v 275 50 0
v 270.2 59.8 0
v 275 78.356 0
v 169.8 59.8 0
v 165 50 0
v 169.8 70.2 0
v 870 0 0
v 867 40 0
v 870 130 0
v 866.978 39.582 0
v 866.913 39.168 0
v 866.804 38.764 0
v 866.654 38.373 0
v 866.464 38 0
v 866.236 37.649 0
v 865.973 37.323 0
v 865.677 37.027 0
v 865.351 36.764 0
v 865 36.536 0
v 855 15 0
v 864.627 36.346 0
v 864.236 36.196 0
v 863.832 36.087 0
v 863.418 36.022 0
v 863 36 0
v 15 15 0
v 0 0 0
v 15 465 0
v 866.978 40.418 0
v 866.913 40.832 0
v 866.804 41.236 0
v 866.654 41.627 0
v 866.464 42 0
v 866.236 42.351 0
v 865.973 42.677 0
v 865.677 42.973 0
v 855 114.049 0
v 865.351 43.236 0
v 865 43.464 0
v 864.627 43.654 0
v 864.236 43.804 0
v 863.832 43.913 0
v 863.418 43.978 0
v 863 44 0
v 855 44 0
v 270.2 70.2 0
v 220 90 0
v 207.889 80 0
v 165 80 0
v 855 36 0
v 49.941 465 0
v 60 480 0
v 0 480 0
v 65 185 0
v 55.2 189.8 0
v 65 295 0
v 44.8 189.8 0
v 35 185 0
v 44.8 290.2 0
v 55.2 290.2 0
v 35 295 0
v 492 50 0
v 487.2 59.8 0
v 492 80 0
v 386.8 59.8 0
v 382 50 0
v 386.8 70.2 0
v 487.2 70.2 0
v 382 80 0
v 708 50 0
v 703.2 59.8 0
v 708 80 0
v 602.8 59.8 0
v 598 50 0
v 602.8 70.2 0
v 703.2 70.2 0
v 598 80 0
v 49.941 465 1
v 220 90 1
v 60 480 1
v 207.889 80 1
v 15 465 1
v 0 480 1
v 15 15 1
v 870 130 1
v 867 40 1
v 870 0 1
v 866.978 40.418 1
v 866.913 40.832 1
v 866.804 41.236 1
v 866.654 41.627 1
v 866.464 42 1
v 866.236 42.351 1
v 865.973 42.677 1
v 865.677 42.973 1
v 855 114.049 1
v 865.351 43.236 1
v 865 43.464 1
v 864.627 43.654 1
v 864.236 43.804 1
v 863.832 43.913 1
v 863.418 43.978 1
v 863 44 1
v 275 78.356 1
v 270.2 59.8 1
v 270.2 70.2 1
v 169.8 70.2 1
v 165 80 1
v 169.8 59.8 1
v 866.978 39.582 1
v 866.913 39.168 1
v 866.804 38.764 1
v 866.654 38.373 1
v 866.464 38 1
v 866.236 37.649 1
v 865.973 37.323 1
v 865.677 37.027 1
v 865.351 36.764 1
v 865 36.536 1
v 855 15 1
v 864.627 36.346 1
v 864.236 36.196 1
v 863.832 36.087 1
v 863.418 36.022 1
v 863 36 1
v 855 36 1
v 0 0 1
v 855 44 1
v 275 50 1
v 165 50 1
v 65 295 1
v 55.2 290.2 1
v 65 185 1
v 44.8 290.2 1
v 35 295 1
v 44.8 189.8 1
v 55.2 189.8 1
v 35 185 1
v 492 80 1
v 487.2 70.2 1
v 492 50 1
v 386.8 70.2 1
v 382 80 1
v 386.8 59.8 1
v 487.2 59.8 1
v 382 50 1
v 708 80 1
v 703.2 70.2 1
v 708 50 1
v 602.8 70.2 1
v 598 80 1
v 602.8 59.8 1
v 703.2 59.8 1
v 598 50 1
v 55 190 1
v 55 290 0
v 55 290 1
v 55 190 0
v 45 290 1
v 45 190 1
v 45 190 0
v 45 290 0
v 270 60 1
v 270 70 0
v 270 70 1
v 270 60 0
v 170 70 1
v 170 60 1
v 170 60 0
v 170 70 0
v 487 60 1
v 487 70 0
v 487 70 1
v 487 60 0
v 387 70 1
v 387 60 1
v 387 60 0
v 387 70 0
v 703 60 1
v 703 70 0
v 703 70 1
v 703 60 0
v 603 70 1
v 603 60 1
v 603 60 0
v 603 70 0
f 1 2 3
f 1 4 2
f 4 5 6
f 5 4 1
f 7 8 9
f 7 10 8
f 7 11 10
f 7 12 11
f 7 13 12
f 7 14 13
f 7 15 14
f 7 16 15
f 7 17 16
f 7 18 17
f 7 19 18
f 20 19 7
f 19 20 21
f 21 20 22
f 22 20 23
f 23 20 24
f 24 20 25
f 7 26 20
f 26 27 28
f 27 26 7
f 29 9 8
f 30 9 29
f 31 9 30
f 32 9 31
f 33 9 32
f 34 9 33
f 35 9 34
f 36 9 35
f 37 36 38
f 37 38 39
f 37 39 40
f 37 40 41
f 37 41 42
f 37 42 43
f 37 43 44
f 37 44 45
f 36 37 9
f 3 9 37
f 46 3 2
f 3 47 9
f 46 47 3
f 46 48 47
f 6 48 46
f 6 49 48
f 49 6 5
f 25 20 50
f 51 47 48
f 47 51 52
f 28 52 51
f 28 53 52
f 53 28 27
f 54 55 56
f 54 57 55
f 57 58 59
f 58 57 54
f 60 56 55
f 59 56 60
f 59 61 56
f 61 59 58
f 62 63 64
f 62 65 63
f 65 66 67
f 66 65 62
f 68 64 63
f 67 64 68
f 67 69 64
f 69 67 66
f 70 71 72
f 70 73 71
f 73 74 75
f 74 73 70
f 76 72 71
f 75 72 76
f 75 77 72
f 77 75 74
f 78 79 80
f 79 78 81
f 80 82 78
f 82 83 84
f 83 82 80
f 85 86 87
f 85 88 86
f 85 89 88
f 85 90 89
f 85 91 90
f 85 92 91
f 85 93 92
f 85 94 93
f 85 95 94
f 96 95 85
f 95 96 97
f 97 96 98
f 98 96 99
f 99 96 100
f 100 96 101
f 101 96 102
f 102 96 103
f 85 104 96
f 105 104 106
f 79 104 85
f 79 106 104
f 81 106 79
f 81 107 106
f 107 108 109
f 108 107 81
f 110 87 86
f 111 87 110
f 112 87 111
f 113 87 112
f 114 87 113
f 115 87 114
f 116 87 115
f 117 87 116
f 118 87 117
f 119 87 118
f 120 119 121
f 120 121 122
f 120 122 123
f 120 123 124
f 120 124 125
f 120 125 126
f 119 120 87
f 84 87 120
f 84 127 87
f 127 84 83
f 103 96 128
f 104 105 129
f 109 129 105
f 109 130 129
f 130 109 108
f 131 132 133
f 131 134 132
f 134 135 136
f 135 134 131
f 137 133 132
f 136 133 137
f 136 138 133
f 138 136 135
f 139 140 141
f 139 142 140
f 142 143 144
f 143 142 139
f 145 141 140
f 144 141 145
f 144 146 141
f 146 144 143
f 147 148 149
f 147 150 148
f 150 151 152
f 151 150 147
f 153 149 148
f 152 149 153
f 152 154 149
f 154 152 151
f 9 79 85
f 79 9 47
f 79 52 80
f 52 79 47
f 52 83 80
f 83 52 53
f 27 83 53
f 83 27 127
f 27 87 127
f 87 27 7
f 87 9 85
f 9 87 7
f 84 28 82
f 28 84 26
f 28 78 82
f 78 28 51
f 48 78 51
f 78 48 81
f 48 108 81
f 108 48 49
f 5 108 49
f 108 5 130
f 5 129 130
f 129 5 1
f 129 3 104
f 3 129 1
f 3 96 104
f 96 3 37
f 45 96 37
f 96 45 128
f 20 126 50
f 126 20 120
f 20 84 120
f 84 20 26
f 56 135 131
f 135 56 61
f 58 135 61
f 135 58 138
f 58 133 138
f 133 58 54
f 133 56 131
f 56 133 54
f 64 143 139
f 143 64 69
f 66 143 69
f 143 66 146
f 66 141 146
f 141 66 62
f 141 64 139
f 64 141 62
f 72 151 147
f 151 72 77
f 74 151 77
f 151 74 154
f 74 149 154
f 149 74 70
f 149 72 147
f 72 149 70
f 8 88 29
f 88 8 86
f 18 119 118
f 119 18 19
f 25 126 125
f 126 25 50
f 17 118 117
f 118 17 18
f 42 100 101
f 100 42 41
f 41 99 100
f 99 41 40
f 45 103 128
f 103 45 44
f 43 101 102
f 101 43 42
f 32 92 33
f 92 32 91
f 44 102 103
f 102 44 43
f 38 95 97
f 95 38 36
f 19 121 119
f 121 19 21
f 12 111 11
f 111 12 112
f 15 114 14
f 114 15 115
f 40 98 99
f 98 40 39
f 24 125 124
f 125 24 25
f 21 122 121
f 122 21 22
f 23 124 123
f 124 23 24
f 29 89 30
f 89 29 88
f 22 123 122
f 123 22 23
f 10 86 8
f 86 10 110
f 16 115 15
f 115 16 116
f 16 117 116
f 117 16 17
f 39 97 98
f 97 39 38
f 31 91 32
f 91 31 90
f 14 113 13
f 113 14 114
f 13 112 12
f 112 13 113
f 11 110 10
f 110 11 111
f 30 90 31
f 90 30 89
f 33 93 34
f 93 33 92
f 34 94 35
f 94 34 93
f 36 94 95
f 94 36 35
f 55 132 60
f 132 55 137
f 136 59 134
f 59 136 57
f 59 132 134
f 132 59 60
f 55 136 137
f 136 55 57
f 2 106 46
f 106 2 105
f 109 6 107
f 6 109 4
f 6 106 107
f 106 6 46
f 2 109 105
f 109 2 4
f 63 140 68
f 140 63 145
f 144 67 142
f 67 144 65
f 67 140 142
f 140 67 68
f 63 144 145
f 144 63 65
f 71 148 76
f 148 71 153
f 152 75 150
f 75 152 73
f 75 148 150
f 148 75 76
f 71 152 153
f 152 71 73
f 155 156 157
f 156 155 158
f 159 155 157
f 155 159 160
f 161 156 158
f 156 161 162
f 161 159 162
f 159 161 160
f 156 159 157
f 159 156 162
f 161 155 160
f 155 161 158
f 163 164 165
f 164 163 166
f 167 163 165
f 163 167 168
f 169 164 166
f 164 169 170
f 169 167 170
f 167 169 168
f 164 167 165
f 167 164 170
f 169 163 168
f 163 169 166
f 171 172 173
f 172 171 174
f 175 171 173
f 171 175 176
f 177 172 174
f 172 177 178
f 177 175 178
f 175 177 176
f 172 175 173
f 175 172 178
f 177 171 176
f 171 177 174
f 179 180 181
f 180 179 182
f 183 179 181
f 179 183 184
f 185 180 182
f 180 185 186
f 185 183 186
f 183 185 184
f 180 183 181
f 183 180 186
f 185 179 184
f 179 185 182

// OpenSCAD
// ==========================================
// Custom Sofa Side - Perimeter Frame Model
// ==========================================
// This model represents the perimeter frame (outline) of the custom L-shaped sofa side.
// It is intended for quick fitment testing (1mm thickness, hollow inside).
//
// Sliced into 5 printable pieces that fit on a 260mm x 260mm printer bed.
// Solid bridges are created at the connections to house the 100mm x 10mm flat bars
// and indents, allowing the frame to be assembled into one solid piece.
// All dimensions are in millimeters (mm).
//
// You can customize the parameters and choose which part to render below.

/* [Visualization & Rendering] */
// Select which part to display/export
show_part = 0; // [0:All Assembled, 1:Part 1, 2:Part 2, 3:Part 3, 4:Part 4, 5:Part 5, 6:Exploded View]

// Separation distance for the exploded view (when show_part = 6)
explode_distance = 60; // [0:200]

/* [Main Dimensions] */
// Thickness of the test frame and the connection bars (default 1mm for quick printing)
thickness = 1;

// Width of the perimeter outline band
wall_width = 15;

// Total width of the bottom edge
bottom_width = 870;

// Total height of the left edge
total_height = 480;

// Width of the horizontal flat section at the top of the backrest
top_width = 60;

// Horizontal span of the backrest slope
slope_span_x = 160;

// Vertical drop of the backrest slope
slope_drop_y = 390;

// Height of the right vertical edge (above the base)
right_height = 130;

/* [Screw Holes] */
// Diameter of the screw holes
hole_diameter = 8;

// Horizontal adjustment range of the slots
slot_length = 20;

// Height of the screw holes from the bottom edge
hole_y = 40;

// X-coordinate of the first (leftmost) hole
hole_1_x = 95;

// Distance from the first hole to the middle hole
hole_1_to_2_distance = 292;

// Distance from the first hole to the rightmost hole
hole_1_to_3_distance = 758;

/* [Alignment Bars & Slots] */
// Width of the flat alignment bars
bar_width = 10;

// Length of the flat alignment bars
bar_length = 100;

// Tolerance/clearance around the bar in the slot (3D printing clearance)
bar_tolerance = 0.2;

// X-coordinate of the single backrest connector (left side of Cut 1)
connector_x = 50;

/* [Internal Splitting Parameters] */
// X-coordinate where the backrest is split from the seat
cut_x_left = 220;

// Y-coordinate where the backrest is split horizontally
cut_y_back = 240;

// First X-coordinate splitting the seat
cut_x_seat1 = 437; // 220 + (870-220)/3 ≈ 437

// Second X-coordinate splitting the seat
cut_x_seat2 = 653; // 220 + 2*(870-220)/3 ≈ 653

// Number of fragments for circular holes (smoothness)
$fn = 60;

// 2D Profile of the Sofa Side
module sofa_side_2d() {
    points = [
        [0, 0],                                      // A: Bottom-left corner
        [bottom_width, 0],                           // B: Bottom-right corner
        [bottom_width, right_height],                // C: Top of the right vertical edge
        [top_width + slope_span_x, total_height - slope_drop_y], // D: Bottom of the backrest slope
        [top_width, total_height],                   // E: Top of the backrest slope
        [0, total_height]                            // F: Top-left corner
    ];
    
    polygon(points);
}

// 2D Frame (hollow outline with solid bridges at connection zones)
module sofa_side_2d_frame() {
    difference() {
        sofa_side_2d();
        
        // Subtract hollow interior, excluding the solid connection bridges
        difference() {
            offset(delta = -wall_width) {
                sofa_side_2d();
            }
            
            // Bridge 1 (Cut 1: Horizontal cut at Y = 240)
            translate([connector_x - 15, cut_y_back - 55])
                square([30, 110]);
                
            // Bridge 2 (Cut 2: Vertical cut at X = 220)
            translate([cut_x_left - 55, 65 - 15])
                square([110, 30]);
                
            // Bridge 3 (Cut 3: Vertical cut at X = 437)
            translate([cut_x_seat1 - 55, 65 - 15])
                square([110, 30]);
                
            // Bridge 4 (Cut 4: Vertical cut at X = 653)
            translate([cut_x_seat2 - 55, 65 - 15])
                square([110, 30]);
        }
    }
}

// Helper module for a rounded adjustment slot (horizontal)
module screw_hole_slot(x, y) {
    translate([x, y, -0.05]) {
        hull() {
            translate([-slot_length / 2, 0, 0])
                cylinder(d = hole_diameter, h = thickness + 0.1);
            translate([slot_length / 2, 0, 0])
                cylinder(d = hole_diameter, h = thickness + 0.1);
        }
    }
}

// 3D Extruded Frame with Screw Holes
module sofa_side_3d() {
    difference() {
        // Extrude the 2D frame profile
        linear_extrude(height = thickness, center = false) {
            sofa_side_2d_frame();
        }
        
        // Subtract screw holes (only visible if they intersect the frame wall)
        screw_hole_slot(hole_1_x, hole_y);
        screw_hole_slot(hole_1_x + hole_1_to_2_distance, hole_y);
        screw_hole_slot(hole_1_x + hole_1_to_3_distance, hole_y);
    }
}

// Alignment Bar Indents/Slots module
// Subtracts pockets from the cut faces. Pockets include the bar_tolerance on all sides.
module all_indents() {
    t_w = bar_width + 2 * bar_tolerance;
    t_l = bar_length + 2 * bar_tolerance;
    t_h = thickness + 0.2;
    
    // Cut 1: Vertical slot crossing Y = cut_y_back at X = connector_x
    translate([connector_x - t_w/2, cut_y_back - t_l/2, -0.1])
        cube([t_w, t_l, t_h]);
        
    // Cut 2: Horizontal slot crossing X = cut_x_left (at Y = 65)
    translate([cut_x_left - t_l/2, 65 - t_w/2, -0.1])
        cube([t_l, t_w, t_h]);
        
    // Cut 3: Horizontal slot crossing X = cut_x_seat1 (at Y = 65)
    translate([cut_x_seat1 - t_l/2, 65 - t_w/2, -0.1])
        cube([t_l, t_w, t_h]);

    // Cut 4: Horizontal slot crossing X = cut_x_seat2 (at Y = 65)
    translate([cut_x_seat2 - t_l/2, 65 - t_w/2, -0.1])
        cube([t_l, t_w, t_h]);
}

// --- MODULES FOR INDIVIDUAL PIECES ---

// Part 1: Top Left backrest frame
module part1() {
    color("LightCoral")
    difference() {
        intersection() {
            sofa_side_3d();
            translate([-50, cut_y_back, -50])
                cube([cut_x_left + 50, total_height - cut_y_back + 100, thickness + 100]);
        }
        all_indents();
    }
}

// Part 2: Bottom Left backrest base frame
module part2() {
    color("LightGreen")
    difference() {
        intersection() {
            sofa_side_3d();
            translate([-50, -50, -50])
                cube([cut_x_left + 50, cut_y_back + 50, thickness + 100]);
        }
        all_indents();
    }
}

// Part 3: Seat Left section frame
module part3() {
    color("LightBlue")
    difference() {
        intersection() {
            sofa_side_3d();
            translate([cut_x_left, -50, -50])
                cube([cut_x_seat1 - cut_x_left, total_height + 100, thickness + 100]);
        }
        all_indents();
    }
}

// Part 4: Seat Middle section frame
module part4() {
    color("LightGoldenrodYellow")
    difference() {
        intersection() {
            sofa_side_3d();
            translate([cut_x_seat1, -50, -50])
                cube([cut_x_seat2 - cut_x_seat1, total_height + 100, thickness + 100]);
        }
        all_indents();
    }
}

// Part 5: Seat Right section frame
module part5() {
    color("Plum")
    difference() {
        intersection() {
            sofa_side_3d();
            translate([cut_x_seat2, -50, -50])
                cube([bottom_width - cut_x_seat2 + 50, total_height + 100, thickness + 100]);
        }
        all_indents();
    }
}

// --- PRINTABLE GROUPINGS (PART + 1 BAR FOR PARTS 1, 3, 4, AND 5) ---

module part1_printable() {
    part1();
    // Place 1 vertical bar for Cut 1
    translate([cut_x_left + 10, cut_y_back, 0])
        color("DarkOrange") cube([bar_width, bar_length, thickness]);
}

module part2_printable() {
    part2();
}

module part3_printable() {
    translate([-cut_x_left, 20, 0])
        part3();
    // Place 1 horizontal bar for Cut 2
    translate([0, 0, 0])
        color("DarkOrange") cube([bar_length, bar_width, thickness]);
}

module part4_printable() {
    translate([-cut_x_seat1, 20, 0])
        part4();
    // Place 1 horizontal bar for Cut 3
    translate([0, 0, 0])
        color("DarkOrange") cube([bar_length, bar_width, thickness]);
}

module part5_printable() {
    translate([-cut_x_seat2, 20, 0])
        part5();
    // Place 1 horizontal bar for Cut 4
    translate([0, 0, 0])
        color("DarkOrange") cube([bar_length, bar_width, thickness]);
}

// --- DISPLAY LOGIC ---

if (show_part == 0) {
    // Show all parts assembled
    part1();
    part2();
    part3();
    part4();
    part5();
    
    // Render the 4 alignment bars inside the slots
    // Bar 1 (Cut 1 left)
    translate([connector_x - bar_width/2, cut_y_back - bar_length/2, 0])
        color("DarkOrange") cube([bar_width, bar_length, thickness]);
    // Bar 2 (Cut 2 horizontal)
    translate([cut_x_left - bar_length/2, 65 - bar_width/2, 0])
        color("DarkOrange") cube([bar_length, bar_width, thickness]);
    // Bar 3 (Cut 3 horizontal)
    translate([cut_x_seat1 - bar_length/2, 65 - bar_width/2, 0])
        color("DarkOrange") cube([bar_length, bar_width, thickness]);
    // Bar 4 (Cut 4 horizontal)
    translate([cut_x_seat2 - bar_length/2, 65 - bar_width/2, 0])
        color("DarkOrange") cube([bar_length, bar_width, thickness]);
        
} else if (show_part == 1) {
    // Part 1 centered for build plate
    translate([-120, -360, 0])
        part1_printable();
        
} else if (show_part == 2) {
    // Part 2 centered for build plate
    translate([-cut_x_left/2, -cut_y_back/2, 0])
        part2_printable();
        
} else if (show_part == 3) {
    // Part 3 centered for build plate
    translate([-(cut_x_seat1 - cut_x_left)/2, -75, 0])
        part3_printable();
        
} else if (show_part == 4) {
    // Part 4 centered for build plate
    translate([-(cut_x_seat2 - cut_x_seat1)/2, -75, 0])
        part4_printable();
        
} else if (show_part == 5) {
    // Part 5 centered for build plate
    translate([-(bottom_width - cut_x_seat2)/2, -75, 0])
        part5_printable();
        
} else if (show_part == 6) {
    // Exploded view showing fitment and alignment bars
    translate([0, explode_distance, 0]) part1();
    translate([0, 0, 0]) part2();
    translate([explode_distance, 0, 0]) part3();
    translate([explode_distance * 2, 0, 0]) part4();
    translate([explode_distance * 3, 0, 0]) part5();
    
    // Bars floated in the middle of cuts
    // Bar 1 (between Part 1 and Part 2, floated at Y = cut_y_back + explode_distance / 2)
    translate([connector_x - bar_width/2, cut_y_back - bar_length/2 + explode_distance / 2, 0])
        color("DarkOrange") cube([bar_width, bar_length, thickness]);
        
    // Bar 2 (between Part 2 and Part 3, floated at X = cut_x_left + explode_distance / 2)
    translate([cut_x_left - bar_length/2 + explode_distance / 2, 65 - bar_width/2, 0])
        color("DarkOrange") cube([bar_length, bar_width, thickness]);
        
    // Bar 3 (between Part 3 and Part 4, floated at X = cut_x_seat1 + explode_distance * 1.5)
    translate([cut_x_seat1 - bar_length/2 + explode_distance * 1.5, 65 - bar_width/2, 0])
        color("DarkOrange") cube([bar_length, bar_width, thickness]);

    // Bar 4 (between Part 4 and Part 5, floated at X = cut_x_seat2 + explode_distance * 2.5)
    translate([cut_x_seat2 - bar_length/2 + explode_distance * 2.5, 65 - bar_width/2, 0])
        color("DarkOrange") cube([bar_length, bar_width, thickness]);
}
